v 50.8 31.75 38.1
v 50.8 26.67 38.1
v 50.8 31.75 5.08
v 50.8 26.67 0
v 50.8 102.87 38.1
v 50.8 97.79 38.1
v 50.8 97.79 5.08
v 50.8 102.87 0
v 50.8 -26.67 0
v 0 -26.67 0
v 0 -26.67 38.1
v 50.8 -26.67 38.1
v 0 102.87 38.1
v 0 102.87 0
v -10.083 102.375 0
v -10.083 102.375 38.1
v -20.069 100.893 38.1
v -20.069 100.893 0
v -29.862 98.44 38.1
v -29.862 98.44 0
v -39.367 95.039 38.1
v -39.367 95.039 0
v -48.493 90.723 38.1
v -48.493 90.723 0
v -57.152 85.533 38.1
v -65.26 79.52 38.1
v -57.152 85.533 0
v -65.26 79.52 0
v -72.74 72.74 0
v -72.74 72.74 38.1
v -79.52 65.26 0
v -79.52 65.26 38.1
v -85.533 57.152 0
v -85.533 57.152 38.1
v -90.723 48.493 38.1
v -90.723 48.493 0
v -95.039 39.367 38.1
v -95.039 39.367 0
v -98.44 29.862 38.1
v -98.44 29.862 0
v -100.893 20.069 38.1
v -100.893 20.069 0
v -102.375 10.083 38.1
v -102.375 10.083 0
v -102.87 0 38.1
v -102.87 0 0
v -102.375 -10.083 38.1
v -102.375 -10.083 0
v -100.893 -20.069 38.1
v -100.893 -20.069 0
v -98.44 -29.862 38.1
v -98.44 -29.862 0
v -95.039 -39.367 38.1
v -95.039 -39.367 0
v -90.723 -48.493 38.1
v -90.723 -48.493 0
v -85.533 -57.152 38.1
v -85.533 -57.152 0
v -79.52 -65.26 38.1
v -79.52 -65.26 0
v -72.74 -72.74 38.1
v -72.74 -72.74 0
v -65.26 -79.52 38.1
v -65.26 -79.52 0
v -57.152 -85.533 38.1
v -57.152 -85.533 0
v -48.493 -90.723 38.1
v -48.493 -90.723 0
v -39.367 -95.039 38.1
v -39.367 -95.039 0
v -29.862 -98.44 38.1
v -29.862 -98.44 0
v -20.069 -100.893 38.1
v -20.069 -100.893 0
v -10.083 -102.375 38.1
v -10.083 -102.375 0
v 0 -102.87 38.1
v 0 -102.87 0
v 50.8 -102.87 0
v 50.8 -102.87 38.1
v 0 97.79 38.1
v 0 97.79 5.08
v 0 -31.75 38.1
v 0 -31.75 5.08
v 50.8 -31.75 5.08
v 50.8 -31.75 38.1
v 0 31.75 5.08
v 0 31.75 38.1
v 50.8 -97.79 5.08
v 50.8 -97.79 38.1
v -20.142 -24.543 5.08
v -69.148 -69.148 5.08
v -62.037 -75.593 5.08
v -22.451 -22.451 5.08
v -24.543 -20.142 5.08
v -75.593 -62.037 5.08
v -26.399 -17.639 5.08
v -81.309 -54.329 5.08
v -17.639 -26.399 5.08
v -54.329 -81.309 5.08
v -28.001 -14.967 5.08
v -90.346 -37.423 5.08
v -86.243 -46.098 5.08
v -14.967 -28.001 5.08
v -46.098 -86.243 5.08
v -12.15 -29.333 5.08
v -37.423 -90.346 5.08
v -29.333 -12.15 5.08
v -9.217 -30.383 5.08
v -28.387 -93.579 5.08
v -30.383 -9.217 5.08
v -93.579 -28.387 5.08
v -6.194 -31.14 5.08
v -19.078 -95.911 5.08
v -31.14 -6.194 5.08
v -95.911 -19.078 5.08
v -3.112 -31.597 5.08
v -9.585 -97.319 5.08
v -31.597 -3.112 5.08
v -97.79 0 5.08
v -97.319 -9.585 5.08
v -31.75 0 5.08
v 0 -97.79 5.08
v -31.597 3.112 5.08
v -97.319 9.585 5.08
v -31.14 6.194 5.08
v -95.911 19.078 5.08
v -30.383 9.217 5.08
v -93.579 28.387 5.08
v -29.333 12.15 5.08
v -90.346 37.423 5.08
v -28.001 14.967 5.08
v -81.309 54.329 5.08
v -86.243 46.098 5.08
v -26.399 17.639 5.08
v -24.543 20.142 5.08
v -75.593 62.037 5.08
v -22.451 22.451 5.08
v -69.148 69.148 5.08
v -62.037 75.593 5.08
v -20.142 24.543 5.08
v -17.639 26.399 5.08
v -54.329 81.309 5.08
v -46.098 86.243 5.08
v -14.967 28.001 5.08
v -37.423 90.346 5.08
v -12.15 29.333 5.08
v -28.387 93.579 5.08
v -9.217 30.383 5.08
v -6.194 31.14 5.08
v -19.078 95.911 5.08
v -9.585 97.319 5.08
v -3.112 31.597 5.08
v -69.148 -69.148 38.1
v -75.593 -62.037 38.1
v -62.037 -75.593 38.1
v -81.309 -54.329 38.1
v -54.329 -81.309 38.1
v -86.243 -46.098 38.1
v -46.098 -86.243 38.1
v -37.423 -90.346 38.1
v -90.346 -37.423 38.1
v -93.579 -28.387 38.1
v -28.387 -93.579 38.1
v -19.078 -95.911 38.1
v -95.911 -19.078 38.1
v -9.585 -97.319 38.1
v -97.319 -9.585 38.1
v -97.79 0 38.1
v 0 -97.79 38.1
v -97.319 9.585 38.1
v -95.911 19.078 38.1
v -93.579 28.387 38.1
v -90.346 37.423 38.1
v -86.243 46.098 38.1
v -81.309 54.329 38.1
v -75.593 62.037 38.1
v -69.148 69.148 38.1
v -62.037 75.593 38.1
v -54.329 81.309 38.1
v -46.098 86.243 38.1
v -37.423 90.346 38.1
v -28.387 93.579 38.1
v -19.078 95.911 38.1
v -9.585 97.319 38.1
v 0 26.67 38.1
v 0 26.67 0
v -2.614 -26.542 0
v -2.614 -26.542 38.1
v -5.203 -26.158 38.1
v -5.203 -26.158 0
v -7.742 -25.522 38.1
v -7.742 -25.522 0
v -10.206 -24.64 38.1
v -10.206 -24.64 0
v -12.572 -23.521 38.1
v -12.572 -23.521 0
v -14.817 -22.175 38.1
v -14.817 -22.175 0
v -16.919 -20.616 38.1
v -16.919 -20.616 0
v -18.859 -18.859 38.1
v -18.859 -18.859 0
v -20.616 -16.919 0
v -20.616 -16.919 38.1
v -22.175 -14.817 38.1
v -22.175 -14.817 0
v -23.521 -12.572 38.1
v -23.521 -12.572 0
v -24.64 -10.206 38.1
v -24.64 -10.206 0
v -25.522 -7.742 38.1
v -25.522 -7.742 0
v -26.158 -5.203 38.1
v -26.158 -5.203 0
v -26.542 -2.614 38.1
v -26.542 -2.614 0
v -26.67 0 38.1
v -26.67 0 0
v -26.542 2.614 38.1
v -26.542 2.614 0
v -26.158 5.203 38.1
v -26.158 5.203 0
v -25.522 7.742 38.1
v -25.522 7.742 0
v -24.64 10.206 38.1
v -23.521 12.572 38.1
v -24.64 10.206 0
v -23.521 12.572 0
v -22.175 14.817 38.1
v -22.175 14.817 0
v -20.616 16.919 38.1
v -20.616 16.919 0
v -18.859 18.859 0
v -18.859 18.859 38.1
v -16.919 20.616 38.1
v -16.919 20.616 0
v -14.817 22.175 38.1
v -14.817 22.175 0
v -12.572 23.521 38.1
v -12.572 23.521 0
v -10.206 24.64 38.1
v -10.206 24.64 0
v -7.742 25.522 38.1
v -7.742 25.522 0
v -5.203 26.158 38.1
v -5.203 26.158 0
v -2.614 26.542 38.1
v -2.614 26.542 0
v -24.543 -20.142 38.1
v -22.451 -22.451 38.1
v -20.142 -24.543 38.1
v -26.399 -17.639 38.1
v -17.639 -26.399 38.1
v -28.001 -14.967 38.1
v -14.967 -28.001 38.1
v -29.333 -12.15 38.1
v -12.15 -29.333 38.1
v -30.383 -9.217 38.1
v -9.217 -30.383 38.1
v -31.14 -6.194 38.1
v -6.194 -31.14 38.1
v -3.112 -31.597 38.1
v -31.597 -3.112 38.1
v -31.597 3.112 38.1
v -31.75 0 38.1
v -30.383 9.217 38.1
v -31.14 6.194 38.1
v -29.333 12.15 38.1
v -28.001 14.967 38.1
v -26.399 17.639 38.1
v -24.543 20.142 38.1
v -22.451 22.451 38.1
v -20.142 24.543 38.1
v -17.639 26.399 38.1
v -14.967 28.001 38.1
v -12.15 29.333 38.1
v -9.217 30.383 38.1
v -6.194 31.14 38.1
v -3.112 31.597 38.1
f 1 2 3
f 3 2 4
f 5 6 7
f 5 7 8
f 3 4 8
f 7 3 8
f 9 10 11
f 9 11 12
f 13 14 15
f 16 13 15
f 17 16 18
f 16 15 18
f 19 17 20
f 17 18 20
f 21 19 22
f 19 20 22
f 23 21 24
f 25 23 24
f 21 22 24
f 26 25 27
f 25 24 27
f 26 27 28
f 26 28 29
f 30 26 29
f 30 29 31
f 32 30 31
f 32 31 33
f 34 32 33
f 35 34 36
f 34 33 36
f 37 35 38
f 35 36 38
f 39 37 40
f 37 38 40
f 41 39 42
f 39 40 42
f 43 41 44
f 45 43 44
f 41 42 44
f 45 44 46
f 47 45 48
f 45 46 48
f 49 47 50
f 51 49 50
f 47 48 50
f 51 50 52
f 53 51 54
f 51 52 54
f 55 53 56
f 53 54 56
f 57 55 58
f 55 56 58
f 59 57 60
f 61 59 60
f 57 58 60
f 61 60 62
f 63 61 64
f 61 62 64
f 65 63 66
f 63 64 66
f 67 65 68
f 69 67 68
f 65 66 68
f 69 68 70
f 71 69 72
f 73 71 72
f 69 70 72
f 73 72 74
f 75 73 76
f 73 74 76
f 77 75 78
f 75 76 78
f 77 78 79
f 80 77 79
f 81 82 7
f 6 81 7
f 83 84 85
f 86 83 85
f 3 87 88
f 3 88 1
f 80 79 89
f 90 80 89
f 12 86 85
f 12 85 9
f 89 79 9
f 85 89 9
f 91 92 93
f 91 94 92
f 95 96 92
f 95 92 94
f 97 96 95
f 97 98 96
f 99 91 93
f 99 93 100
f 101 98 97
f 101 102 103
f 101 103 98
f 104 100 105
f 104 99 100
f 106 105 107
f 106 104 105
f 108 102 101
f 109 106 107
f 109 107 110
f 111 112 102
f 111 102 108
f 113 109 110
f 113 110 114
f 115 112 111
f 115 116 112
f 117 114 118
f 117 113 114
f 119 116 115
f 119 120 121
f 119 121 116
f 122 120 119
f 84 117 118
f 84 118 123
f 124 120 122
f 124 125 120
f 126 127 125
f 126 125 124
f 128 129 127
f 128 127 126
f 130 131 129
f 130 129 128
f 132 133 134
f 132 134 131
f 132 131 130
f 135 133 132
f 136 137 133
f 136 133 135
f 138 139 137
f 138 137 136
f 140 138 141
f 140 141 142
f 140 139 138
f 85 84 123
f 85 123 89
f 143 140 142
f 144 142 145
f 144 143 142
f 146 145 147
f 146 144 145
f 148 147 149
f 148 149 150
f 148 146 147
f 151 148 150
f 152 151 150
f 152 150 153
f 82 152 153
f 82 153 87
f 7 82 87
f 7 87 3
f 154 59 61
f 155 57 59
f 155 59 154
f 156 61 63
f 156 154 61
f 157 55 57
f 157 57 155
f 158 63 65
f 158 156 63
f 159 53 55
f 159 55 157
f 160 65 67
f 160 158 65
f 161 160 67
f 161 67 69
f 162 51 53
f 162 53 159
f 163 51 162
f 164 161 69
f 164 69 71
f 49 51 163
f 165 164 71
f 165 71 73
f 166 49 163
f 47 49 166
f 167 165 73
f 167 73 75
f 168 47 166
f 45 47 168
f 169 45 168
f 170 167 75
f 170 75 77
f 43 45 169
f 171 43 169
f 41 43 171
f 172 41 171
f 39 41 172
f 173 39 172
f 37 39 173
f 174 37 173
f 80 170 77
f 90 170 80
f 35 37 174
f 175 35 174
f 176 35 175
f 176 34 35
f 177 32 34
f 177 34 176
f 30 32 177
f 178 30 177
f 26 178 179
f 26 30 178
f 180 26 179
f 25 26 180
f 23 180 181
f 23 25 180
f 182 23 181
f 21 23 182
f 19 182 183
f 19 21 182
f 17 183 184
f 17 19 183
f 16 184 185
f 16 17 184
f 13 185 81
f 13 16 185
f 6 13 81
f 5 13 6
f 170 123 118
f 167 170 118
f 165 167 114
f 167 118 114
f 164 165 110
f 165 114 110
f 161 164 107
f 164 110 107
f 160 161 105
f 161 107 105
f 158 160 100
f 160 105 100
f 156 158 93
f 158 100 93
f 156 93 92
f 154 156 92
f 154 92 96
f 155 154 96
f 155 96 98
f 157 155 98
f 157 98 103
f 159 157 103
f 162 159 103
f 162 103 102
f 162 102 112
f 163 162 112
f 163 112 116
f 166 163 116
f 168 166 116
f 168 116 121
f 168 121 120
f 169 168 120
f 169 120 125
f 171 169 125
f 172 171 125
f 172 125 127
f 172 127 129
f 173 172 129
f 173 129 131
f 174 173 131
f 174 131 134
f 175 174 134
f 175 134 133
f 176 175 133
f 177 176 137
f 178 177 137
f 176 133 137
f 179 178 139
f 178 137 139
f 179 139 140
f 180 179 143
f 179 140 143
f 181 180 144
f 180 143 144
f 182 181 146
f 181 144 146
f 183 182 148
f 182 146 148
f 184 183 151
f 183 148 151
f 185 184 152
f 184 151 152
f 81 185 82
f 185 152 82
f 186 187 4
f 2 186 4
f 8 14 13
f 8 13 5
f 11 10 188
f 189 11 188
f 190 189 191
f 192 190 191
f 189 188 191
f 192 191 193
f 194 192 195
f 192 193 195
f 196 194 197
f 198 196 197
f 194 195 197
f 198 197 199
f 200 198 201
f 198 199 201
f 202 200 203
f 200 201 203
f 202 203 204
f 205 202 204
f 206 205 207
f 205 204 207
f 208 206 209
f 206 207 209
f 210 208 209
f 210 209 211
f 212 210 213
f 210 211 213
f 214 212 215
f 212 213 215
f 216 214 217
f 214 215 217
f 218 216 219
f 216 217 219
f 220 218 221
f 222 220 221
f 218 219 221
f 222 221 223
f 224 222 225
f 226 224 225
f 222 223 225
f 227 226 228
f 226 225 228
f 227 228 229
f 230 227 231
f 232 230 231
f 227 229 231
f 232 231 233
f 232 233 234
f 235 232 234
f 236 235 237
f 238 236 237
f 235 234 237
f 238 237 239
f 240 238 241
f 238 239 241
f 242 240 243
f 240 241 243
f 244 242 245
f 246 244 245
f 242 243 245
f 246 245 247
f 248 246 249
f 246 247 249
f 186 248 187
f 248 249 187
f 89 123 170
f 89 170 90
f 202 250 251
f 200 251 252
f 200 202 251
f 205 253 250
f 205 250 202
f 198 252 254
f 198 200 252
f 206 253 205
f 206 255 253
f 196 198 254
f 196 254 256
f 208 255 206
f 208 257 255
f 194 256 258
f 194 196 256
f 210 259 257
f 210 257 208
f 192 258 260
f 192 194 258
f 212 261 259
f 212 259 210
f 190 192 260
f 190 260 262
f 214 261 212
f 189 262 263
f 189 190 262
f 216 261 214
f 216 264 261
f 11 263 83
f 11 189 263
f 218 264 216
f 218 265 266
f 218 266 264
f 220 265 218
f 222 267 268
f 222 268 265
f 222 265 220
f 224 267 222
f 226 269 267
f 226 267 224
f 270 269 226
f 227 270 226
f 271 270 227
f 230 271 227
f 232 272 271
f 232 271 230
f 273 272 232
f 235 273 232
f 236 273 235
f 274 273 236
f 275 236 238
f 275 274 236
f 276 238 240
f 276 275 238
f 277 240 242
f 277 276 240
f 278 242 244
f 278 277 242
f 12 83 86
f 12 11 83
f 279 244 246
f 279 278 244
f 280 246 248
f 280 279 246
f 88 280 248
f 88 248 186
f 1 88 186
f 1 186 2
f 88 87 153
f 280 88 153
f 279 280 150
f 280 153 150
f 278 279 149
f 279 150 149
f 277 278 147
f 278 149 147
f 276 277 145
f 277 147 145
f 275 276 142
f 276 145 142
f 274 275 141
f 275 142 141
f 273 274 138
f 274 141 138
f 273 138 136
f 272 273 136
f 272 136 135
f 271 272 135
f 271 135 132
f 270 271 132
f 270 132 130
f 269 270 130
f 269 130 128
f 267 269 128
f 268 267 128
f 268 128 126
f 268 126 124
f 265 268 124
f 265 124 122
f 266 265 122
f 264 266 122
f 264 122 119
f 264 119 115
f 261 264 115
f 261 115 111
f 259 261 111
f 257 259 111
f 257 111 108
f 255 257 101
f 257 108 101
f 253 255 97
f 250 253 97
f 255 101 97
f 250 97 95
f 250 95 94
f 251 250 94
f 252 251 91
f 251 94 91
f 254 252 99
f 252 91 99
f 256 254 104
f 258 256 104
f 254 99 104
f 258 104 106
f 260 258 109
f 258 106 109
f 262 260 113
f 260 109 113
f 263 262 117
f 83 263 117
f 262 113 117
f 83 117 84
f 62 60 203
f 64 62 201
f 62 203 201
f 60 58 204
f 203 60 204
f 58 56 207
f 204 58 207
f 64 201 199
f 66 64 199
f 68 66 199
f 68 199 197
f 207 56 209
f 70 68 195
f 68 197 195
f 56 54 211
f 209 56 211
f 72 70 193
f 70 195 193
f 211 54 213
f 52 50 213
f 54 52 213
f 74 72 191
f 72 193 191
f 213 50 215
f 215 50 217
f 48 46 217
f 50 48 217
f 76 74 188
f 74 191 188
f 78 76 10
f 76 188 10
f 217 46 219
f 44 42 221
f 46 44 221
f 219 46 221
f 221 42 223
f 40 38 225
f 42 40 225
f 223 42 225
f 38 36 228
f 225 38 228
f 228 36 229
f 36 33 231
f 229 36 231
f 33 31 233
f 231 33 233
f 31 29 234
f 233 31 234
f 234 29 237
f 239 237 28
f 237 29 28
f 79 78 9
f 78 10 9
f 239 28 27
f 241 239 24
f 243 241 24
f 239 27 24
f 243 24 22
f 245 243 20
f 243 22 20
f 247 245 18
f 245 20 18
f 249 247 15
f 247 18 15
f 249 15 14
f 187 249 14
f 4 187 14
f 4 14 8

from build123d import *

# Parameters (mm, degrees)
F0_W     = 50.8
F0_H     = 66.04
F1_DEPTH = 5.08
F0_H_2   = 5.08
F2_DEPTH = 38.1


with BuildPart() as f1:
    # F0 (on Top) → F1 (new body)
    with BuildSketch(Plane.XY):
        with BuildLine():
            ThreePointArc((0, -31.75), (-31.75, 0), (0, 31.75))
            Line((0, 31.75), (0, 97.79))
            ThreePointArc((0, 97.79), (-97.79, 0), (0, -97.79))
            Line((0, -97.79), (0, -31.75))
        make_face()
        with Locations((25.4, -64.77)):
            Rectangle(F0_W, F0_H)
        with Locations((25.4, 64.77)):
            Rectangle(F0_W, F0_H)
    extrude(amount=F1_DEPTH)

    # F0 (on Top) → F2 (join)
    with BuildSketch(Plane.XY):
        with BuildLine():
            ThreePointArc((0, -97.79), (-97.79, 0), (0, 97.79))
            Line((0, 97.79), (0, 102.87))
            ThreePointArc((0, 102.87), (-102.87, 0), (0, -102.87))
            Line((0, -102.87), (0, -97.79))
        make_face()
        with Locations((25.4, -100.33)):
            Rectangle(F0_W, F0_H_2)
        with BuildLine():
            Line((0, 26.67), (0, 31.75))
            ThreePointArc((0, 31.75), (-31.75, 0), (0, -31.75))
            Line((0, -31.75), (0, -26.67))
            ThreePointArc((0, -26.67), (-26.67, 0), (0, 26.67))
        make_face()
        with Locations((25.4, -29.21)):
            Rectangle(F0_W, F0_H_2)
        with Locations((25.4, 29.21)):
            Rectangle(F0_W, F0_H_2)
        with Locations((25.4, 100.33)):
            Rectangle(F0_W, F0_H_2)
    extrude(amount=F2_DEPTH)


solid = f1.part
